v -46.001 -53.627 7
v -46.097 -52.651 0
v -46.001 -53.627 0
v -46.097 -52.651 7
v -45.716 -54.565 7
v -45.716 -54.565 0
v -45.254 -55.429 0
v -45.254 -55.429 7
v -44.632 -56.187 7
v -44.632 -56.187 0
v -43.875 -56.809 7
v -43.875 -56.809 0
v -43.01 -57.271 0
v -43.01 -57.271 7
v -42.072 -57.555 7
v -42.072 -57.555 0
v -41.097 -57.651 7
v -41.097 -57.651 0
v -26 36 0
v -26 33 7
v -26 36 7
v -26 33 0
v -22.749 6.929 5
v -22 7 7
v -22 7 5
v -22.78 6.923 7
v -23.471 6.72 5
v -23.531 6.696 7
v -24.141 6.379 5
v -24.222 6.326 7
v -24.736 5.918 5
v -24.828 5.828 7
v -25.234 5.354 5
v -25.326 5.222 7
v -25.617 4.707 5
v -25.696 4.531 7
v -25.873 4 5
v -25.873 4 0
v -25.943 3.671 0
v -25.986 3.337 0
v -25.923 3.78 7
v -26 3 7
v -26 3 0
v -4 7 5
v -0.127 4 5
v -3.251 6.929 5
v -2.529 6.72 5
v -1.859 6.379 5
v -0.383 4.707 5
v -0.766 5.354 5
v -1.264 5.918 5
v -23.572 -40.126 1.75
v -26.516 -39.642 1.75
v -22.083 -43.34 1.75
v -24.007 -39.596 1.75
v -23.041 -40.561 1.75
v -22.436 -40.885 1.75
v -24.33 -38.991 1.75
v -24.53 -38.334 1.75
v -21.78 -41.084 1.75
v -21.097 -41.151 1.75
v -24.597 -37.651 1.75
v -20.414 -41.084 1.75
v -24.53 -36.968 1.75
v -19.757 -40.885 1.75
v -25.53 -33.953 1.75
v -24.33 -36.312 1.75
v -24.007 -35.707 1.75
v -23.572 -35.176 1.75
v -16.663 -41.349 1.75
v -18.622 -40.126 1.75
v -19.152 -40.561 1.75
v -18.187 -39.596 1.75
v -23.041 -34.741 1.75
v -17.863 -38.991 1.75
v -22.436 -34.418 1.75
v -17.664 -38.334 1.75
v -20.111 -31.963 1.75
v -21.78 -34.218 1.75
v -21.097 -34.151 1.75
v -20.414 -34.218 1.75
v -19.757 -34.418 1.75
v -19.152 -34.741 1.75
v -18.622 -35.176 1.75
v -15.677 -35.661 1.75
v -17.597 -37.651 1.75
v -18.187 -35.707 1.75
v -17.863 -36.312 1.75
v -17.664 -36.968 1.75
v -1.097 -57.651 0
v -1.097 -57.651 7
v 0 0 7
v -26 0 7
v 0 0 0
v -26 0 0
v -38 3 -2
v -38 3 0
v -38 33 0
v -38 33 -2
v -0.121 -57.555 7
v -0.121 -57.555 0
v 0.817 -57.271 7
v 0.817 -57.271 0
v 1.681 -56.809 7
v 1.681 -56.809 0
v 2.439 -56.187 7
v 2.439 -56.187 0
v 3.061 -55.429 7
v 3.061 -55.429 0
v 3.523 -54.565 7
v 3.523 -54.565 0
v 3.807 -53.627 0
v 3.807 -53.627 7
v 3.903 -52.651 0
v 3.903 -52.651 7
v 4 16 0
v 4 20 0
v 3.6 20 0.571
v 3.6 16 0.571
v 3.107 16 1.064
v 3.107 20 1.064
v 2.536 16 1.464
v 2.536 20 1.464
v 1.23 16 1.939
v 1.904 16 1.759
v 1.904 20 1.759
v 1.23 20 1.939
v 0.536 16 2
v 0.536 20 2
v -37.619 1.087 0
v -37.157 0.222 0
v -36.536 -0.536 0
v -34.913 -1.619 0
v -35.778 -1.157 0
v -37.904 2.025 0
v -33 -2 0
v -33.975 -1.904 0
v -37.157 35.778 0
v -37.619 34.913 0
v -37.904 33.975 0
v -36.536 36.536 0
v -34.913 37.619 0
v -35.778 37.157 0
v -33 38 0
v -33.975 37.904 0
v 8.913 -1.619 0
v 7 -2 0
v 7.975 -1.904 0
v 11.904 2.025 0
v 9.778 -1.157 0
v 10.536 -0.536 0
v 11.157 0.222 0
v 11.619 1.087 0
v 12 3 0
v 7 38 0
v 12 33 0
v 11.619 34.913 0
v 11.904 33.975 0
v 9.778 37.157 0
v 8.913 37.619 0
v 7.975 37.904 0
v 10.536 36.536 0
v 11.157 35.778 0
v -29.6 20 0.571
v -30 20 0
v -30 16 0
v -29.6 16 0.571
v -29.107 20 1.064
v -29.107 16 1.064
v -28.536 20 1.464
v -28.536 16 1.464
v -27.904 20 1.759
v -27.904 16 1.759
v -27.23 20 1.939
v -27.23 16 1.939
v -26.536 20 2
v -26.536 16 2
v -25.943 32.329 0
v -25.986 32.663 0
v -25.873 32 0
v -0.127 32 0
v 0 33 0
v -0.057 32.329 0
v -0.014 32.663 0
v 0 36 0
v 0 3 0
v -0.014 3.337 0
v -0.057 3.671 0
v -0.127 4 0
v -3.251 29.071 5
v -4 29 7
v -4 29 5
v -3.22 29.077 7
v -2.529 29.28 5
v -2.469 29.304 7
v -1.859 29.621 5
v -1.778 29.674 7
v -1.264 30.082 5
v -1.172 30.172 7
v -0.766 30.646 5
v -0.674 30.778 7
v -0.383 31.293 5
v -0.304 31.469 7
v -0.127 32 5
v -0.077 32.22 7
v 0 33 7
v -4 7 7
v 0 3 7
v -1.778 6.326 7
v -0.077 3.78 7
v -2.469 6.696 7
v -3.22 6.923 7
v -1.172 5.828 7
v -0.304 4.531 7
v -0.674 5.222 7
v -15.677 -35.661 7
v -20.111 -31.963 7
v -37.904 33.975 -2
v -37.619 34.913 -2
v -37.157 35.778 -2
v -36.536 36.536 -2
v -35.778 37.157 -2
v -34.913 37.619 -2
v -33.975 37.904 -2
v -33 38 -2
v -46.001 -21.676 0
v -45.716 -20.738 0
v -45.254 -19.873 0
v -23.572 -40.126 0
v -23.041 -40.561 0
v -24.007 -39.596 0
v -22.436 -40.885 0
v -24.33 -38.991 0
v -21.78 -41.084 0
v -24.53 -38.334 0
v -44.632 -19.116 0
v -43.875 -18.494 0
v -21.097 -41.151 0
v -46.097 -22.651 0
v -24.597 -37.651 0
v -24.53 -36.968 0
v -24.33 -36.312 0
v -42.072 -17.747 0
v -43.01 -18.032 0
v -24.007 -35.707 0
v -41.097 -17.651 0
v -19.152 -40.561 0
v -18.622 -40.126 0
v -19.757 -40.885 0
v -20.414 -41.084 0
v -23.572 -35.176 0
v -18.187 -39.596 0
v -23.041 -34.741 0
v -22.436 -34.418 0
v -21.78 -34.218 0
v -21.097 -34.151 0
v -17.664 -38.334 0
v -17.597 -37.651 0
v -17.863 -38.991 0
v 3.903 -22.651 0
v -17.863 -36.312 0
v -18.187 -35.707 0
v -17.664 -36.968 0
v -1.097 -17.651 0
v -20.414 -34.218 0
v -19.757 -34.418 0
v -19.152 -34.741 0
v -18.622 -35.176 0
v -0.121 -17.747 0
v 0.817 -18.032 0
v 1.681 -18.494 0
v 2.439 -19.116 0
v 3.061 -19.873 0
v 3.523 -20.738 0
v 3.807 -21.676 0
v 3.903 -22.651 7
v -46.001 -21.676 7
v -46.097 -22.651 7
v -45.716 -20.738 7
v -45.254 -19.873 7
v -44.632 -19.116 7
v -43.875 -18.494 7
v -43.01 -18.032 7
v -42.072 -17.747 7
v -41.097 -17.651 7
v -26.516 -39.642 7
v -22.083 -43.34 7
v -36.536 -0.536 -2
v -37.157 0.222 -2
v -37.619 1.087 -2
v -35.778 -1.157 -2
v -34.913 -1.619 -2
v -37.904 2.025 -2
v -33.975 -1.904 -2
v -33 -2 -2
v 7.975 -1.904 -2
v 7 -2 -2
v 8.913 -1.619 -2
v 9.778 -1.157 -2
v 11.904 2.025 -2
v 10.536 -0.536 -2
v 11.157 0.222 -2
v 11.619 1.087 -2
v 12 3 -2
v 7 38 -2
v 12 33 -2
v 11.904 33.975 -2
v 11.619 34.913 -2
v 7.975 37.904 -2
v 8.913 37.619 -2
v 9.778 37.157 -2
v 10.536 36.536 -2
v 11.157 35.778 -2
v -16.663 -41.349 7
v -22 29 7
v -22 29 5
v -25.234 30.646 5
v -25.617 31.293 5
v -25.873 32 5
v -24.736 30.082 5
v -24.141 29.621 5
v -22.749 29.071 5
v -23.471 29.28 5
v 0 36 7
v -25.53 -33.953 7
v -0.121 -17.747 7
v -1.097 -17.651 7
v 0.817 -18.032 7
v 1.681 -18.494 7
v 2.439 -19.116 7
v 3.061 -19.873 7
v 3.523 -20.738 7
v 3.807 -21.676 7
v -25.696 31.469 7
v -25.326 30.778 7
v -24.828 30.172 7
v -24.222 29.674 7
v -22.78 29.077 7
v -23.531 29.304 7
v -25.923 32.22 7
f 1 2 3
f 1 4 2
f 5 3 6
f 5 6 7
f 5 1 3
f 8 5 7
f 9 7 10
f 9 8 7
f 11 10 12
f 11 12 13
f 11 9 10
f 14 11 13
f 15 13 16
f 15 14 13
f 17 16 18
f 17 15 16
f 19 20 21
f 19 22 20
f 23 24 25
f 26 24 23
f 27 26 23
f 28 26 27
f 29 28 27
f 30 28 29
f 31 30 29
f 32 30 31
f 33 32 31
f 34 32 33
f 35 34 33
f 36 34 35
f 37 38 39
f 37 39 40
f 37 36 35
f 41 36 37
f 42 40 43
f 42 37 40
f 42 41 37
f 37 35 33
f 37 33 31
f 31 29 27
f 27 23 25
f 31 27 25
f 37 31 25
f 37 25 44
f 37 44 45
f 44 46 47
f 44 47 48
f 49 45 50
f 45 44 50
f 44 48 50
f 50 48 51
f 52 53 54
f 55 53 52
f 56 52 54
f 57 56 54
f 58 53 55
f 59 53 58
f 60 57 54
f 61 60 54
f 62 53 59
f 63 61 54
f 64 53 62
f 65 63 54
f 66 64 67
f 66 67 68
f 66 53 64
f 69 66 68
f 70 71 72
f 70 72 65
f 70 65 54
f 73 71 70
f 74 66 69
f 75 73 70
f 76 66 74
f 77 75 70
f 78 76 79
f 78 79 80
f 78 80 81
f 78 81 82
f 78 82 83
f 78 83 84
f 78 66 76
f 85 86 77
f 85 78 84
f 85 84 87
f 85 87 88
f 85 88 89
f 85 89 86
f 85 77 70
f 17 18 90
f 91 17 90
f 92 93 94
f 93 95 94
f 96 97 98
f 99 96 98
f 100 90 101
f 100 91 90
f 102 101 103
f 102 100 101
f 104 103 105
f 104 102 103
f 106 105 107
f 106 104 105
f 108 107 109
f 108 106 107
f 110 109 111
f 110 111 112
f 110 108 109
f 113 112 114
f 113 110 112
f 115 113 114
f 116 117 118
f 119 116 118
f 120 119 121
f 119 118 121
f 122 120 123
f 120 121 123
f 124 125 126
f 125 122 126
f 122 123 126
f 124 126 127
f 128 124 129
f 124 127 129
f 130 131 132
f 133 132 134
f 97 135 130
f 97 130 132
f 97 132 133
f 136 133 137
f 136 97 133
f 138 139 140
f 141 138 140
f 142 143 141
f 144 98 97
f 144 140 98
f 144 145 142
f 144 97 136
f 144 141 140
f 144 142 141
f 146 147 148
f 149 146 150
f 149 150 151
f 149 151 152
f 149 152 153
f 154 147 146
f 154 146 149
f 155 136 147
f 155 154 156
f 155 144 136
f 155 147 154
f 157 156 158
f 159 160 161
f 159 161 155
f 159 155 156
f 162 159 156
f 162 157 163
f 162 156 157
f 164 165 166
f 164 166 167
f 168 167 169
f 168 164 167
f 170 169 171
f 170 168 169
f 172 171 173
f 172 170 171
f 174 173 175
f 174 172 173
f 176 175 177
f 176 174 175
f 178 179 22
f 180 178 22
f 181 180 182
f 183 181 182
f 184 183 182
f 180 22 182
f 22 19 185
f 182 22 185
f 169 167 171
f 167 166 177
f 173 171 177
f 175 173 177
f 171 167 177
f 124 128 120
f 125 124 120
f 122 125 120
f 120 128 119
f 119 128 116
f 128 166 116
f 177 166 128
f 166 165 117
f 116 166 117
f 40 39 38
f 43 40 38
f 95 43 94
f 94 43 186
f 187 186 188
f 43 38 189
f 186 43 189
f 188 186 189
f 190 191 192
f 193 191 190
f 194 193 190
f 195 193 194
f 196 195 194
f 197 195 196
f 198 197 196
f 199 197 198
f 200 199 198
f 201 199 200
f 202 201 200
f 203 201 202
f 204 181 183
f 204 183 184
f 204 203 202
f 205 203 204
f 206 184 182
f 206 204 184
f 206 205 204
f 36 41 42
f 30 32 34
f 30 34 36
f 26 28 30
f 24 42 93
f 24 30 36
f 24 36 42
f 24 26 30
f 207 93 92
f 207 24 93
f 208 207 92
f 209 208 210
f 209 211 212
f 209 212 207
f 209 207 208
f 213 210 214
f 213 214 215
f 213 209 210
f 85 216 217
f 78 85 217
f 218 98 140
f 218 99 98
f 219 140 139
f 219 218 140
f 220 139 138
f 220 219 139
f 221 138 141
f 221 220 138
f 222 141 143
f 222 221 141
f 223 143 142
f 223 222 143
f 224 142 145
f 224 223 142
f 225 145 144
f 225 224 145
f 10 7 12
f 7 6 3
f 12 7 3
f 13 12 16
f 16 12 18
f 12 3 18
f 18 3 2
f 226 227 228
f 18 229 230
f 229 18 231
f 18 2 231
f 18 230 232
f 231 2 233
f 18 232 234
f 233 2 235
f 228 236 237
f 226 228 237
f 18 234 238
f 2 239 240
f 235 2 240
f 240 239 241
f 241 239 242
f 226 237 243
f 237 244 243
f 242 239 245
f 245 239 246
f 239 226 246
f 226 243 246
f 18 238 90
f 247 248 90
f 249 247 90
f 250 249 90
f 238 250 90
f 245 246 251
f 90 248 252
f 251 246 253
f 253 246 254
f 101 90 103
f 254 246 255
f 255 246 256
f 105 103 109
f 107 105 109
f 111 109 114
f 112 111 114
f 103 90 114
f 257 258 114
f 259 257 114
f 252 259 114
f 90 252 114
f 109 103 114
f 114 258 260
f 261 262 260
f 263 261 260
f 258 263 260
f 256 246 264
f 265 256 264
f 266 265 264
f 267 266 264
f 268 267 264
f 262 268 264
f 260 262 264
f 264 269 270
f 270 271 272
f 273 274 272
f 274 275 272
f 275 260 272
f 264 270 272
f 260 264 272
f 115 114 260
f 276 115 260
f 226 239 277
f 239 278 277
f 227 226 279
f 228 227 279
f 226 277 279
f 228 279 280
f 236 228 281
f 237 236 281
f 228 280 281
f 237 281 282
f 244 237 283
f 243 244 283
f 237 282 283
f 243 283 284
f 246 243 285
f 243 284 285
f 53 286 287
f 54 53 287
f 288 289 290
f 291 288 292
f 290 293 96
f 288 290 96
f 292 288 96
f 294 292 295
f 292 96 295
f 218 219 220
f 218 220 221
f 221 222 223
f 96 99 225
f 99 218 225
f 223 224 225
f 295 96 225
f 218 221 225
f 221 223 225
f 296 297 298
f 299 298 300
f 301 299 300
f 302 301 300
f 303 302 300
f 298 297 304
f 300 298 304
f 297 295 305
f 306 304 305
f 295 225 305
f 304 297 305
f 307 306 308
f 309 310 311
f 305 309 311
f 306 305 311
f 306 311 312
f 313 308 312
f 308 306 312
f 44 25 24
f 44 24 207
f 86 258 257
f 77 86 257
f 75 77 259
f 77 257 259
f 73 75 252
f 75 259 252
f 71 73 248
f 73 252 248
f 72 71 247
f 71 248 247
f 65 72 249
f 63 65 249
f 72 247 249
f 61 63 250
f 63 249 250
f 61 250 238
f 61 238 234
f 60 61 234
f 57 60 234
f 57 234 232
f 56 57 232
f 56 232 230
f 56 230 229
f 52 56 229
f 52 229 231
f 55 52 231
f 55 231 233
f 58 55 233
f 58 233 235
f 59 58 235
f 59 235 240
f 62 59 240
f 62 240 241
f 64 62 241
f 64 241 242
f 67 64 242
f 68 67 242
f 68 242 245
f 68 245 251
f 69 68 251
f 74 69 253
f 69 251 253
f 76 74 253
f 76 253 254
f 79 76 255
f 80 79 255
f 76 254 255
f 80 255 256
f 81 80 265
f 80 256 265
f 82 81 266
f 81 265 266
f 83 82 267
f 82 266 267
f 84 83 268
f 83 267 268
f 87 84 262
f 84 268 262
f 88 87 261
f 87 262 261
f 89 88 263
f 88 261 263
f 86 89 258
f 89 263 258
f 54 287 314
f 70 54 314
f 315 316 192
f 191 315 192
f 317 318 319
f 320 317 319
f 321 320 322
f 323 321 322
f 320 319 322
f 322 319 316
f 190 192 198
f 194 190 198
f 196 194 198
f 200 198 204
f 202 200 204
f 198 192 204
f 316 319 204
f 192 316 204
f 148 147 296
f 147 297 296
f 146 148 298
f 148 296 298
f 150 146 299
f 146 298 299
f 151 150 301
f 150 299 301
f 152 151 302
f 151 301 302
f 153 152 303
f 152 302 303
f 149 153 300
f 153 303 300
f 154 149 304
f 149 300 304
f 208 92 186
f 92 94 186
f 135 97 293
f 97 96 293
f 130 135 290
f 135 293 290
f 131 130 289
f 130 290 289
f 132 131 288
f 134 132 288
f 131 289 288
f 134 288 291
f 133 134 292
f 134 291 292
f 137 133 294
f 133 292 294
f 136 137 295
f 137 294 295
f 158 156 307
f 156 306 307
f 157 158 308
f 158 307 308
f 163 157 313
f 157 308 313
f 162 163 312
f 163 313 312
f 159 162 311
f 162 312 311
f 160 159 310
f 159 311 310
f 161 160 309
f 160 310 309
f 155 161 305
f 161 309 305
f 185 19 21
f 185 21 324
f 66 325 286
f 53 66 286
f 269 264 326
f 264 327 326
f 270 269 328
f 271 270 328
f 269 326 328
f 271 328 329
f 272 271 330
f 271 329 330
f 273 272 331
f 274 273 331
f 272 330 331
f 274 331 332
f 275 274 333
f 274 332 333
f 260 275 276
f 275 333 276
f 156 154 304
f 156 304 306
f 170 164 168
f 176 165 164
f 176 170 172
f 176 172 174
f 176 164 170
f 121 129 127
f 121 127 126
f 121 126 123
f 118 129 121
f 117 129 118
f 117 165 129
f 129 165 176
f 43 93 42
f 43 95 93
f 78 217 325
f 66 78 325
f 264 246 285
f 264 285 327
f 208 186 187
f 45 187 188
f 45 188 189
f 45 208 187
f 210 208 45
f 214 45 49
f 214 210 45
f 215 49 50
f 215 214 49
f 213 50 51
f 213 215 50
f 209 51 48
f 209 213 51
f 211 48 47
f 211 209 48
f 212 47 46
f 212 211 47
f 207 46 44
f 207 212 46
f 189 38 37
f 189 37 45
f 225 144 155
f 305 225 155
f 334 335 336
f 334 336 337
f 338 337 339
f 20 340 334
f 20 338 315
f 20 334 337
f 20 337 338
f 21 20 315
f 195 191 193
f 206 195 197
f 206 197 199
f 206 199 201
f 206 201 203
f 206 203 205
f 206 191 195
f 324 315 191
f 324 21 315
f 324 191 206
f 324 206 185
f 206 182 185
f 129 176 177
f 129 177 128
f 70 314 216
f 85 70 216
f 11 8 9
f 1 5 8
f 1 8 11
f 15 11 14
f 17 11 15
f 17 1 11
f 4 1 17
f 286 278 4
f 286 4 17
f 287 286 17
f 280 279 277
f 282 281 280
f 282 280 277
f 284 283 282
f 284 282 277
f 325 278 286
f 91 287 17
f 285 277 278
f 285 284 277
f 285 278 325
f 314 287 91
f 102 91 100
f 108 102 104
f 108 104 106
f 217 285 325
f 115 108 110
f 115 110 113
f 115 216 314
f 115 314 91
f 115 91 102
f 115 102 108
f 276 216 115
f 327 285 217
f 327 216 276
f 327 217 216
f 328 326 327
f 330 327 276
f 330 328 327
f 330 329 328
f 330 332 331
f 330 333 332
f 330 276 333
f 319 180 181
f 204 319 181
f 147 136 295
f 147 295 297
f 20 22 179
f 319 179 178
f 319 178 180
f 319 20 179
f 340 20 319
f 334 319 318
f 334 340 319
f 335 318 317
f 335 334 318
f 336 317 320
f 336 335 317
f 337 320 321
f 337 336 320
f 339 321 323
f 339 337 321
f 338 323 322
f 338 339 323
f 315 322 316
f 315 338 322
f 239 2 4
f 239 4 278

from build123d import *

# Parameters (mm, degrees)
F0_W           = 26
F0_H           = 4
F1_DEPTH       = 5
F2_W           = 26
F2_H           = 7
F3_DEPTH       = 2
F4_W           = 34
F4_H           = 4
F5_DEPTH       = 2
F6_W           = 50
F6_H           = 40
F7_DEPTH       = 2
F8_W           = 50
F8_H           = 40
F9_DEPTH       = 7
F11_R          = 3.5
F12_DEPTH      = 7.001
F13_DEPTH      = 5.25
F14_F1_R       = 4
F14_F2_R       = 4
F14_2_F1_R     = 4
F14_2_F2_R     = 4
F14_3_T1_DEPTH = 21.3205080757
F15_R          = 5
F16_R          = 5


# Not quite as in the source:
# - a fillet or chamfer that OpenCascade refuses, or shapes differently, is made with other operations: its cross-section is extruded or revolved along the edge and cut away or added


with BuildPart() as f1:
    # F0 (on Top) → F1 (new body)
    with BuildSketch(Plane.XY):
        with Locations((-13, 2)):
            Rectangle(F0_W, F0_H)
    extrude(amount=F1_DEPTH)

    # F2 (on face) → F3 (join)
    with BuildSketch(Plane.XY.offset(5)):
        with Locations((-13, 3.5)):
            Rectangle(F2_W, F2_H)
    extrude(amount=F3_DEPTH)

    # F14: fillet of radius 4 on 2 edges, made by hand

    # F14_f1
    f14_f1_edges = [f1.edges().sort_by_distance(p)[0] for p in [
        (0, 7, 6),
    ]]
    fillet(f14_f1_edges, radius=F14_F1_R)

    # F14_f2
    f14_f2_edges = [f1.edges().sort_by_distance(p)[0] for p in [
        (-26, 7, 6),
    ]]
    fillet(f14_f2_edges, radius=F14_F2_R)


with BuildPart() as f1b:
    # F0 (on Top) → F1, piece 2 (new body)
    with BuildSketch(Plane.XY):
        with Locations((-13, 34)):
            Rectangle(F0_W, F0_H)
    extrude(amount=F1_DEPTH)

    # F2 (on face) → F3, piece 2 (join)
    with BuildSketch(Plane.XY.offset(5)):
        with Locations((-13, 32.5)):
            Rectangle(F2_W, F2_H)
    extrude(amount=F3_DEPTH)

    # F14#2: fillet of radius 4 on 2 edges, made by hand

    # F14_2_f1
    f14_2_f1_edges = [f1b.edges().sort_by_distance(p)[0] for p in [
        (-26, 29, 6),
    ]]
    fillet(f14_2_f1_edges, radius=F14_2_F1_R)

    # F14_2_f2
    f14_2_f2_edges = [f1b.edges().sort_by_distance(p)[0] for p in [
        (0, 29, 6),
    ]]
    fillet(f14_2_f2_edges, radius=F14_2_F2_R)


with BuildPart() as f5:
    # F4 (on Top) → F5 (new body)
    with BuildSketch(Plane.XY):
        with Locations((-13, 18)):
            Rectangle(F4_W, F4_H)
    extrude(amount=F5_DEPTH)

    # F14#3: fillet of radius 4 on 2 edges, made by hand

    # F14_3_s2 → F14_3_t1 (cut)
    with BuildSketch(Plane.XZ.offset(-28.6602540378)):
        with BuildLine():
            ThreePointArc((4, 0), (2.5358983849, 1.4641016151), (0.5358983849, 2))
            Line((0.5358983849, 2), (4, 2))
            Line((4, 2), (4, 0))
        make_face()
        with BuildLine():
            ThreePointArc((-30, 0), (-28.5358983849, 1.4641016151), (-26.5358983849, 2))
            Line((-26.5358983849, 2), (-30, 2))
            Line((-30, 2), (-30, 0))
        make_face()
    extrude(amount=F14_3_T1_DEPTH, mode=Mode.SUBTRACT)


with BuildPart() as f7:
    # F6 (on Top) → F7 (new body)
    with BuildSketch(Plane.XY):
        with Locations((-13, 18)):
            Rectangle(F6_W, F6_H)
    extrude(amount=-F7_DEPTH)

    # F15
    f15_edges = [f7.edges().sort_by_distance(p)[0] for p in [
        (12, -2, -1),
        (12, 38, -1),
        (-38, -2, -1),
        (-38, 38, -1),
    ]]
    fillet(f15_edges, radius=F15_R)


with BuildPart() as f9:
    # F8 (on Top) → F9 (new body)
    with BuildSketch(Plane.XY):
        with Locations((-21.0967977971, -37.6512110233)):
            Rectangle(F8_W, F8_H)
    extrude(amount=F9_DEPTH)

    # F11 (on face) → F12 (cut, through all)
    with BuildSketch(Plane(origin=(0, 0, 0), x_dir=(1, 0, 0), z_dir=(0, 0, -1))):
        with Locations((-21.0967977971, 37.6512110233)):
            Circle(F11_R)
    extrude(amount=-F12_DEPTH, mode=Mode.SUBTRACT)

    # F10 (on face) → F13 (cut)
    with BuildSketch(Plane.XY.offset(7)):
        Polygon((-20.1108978699, -31.9625086522), (-25.5304086014, -33.9530454552), (-26.5163085287, -39.6417478263), (-22.0826977244, -43.3399133944), (-16.6631869928, -41.3493765914), (-15.6772870656, -35.6606742204), align=None)
    extrude(amount=-F13_DEPTH, mode=Mode.SUBTRACT)

    # F16
    f16_edges = [f9.edges().sort_by_distance(p)[0] for p in [
        (-46.096798, -17.651211, 3.5),
        (3.903202, -17.651211, 3.5),
        (-46.096798, -57.651211, 3.5),
        (3.903202, -57.651211, 3.5),
    ]]
    fillet(f16_edges, radius=F16_R)


solid = Compound([f1.part, f1b.part, f5.part, f7.part, f9.part])
